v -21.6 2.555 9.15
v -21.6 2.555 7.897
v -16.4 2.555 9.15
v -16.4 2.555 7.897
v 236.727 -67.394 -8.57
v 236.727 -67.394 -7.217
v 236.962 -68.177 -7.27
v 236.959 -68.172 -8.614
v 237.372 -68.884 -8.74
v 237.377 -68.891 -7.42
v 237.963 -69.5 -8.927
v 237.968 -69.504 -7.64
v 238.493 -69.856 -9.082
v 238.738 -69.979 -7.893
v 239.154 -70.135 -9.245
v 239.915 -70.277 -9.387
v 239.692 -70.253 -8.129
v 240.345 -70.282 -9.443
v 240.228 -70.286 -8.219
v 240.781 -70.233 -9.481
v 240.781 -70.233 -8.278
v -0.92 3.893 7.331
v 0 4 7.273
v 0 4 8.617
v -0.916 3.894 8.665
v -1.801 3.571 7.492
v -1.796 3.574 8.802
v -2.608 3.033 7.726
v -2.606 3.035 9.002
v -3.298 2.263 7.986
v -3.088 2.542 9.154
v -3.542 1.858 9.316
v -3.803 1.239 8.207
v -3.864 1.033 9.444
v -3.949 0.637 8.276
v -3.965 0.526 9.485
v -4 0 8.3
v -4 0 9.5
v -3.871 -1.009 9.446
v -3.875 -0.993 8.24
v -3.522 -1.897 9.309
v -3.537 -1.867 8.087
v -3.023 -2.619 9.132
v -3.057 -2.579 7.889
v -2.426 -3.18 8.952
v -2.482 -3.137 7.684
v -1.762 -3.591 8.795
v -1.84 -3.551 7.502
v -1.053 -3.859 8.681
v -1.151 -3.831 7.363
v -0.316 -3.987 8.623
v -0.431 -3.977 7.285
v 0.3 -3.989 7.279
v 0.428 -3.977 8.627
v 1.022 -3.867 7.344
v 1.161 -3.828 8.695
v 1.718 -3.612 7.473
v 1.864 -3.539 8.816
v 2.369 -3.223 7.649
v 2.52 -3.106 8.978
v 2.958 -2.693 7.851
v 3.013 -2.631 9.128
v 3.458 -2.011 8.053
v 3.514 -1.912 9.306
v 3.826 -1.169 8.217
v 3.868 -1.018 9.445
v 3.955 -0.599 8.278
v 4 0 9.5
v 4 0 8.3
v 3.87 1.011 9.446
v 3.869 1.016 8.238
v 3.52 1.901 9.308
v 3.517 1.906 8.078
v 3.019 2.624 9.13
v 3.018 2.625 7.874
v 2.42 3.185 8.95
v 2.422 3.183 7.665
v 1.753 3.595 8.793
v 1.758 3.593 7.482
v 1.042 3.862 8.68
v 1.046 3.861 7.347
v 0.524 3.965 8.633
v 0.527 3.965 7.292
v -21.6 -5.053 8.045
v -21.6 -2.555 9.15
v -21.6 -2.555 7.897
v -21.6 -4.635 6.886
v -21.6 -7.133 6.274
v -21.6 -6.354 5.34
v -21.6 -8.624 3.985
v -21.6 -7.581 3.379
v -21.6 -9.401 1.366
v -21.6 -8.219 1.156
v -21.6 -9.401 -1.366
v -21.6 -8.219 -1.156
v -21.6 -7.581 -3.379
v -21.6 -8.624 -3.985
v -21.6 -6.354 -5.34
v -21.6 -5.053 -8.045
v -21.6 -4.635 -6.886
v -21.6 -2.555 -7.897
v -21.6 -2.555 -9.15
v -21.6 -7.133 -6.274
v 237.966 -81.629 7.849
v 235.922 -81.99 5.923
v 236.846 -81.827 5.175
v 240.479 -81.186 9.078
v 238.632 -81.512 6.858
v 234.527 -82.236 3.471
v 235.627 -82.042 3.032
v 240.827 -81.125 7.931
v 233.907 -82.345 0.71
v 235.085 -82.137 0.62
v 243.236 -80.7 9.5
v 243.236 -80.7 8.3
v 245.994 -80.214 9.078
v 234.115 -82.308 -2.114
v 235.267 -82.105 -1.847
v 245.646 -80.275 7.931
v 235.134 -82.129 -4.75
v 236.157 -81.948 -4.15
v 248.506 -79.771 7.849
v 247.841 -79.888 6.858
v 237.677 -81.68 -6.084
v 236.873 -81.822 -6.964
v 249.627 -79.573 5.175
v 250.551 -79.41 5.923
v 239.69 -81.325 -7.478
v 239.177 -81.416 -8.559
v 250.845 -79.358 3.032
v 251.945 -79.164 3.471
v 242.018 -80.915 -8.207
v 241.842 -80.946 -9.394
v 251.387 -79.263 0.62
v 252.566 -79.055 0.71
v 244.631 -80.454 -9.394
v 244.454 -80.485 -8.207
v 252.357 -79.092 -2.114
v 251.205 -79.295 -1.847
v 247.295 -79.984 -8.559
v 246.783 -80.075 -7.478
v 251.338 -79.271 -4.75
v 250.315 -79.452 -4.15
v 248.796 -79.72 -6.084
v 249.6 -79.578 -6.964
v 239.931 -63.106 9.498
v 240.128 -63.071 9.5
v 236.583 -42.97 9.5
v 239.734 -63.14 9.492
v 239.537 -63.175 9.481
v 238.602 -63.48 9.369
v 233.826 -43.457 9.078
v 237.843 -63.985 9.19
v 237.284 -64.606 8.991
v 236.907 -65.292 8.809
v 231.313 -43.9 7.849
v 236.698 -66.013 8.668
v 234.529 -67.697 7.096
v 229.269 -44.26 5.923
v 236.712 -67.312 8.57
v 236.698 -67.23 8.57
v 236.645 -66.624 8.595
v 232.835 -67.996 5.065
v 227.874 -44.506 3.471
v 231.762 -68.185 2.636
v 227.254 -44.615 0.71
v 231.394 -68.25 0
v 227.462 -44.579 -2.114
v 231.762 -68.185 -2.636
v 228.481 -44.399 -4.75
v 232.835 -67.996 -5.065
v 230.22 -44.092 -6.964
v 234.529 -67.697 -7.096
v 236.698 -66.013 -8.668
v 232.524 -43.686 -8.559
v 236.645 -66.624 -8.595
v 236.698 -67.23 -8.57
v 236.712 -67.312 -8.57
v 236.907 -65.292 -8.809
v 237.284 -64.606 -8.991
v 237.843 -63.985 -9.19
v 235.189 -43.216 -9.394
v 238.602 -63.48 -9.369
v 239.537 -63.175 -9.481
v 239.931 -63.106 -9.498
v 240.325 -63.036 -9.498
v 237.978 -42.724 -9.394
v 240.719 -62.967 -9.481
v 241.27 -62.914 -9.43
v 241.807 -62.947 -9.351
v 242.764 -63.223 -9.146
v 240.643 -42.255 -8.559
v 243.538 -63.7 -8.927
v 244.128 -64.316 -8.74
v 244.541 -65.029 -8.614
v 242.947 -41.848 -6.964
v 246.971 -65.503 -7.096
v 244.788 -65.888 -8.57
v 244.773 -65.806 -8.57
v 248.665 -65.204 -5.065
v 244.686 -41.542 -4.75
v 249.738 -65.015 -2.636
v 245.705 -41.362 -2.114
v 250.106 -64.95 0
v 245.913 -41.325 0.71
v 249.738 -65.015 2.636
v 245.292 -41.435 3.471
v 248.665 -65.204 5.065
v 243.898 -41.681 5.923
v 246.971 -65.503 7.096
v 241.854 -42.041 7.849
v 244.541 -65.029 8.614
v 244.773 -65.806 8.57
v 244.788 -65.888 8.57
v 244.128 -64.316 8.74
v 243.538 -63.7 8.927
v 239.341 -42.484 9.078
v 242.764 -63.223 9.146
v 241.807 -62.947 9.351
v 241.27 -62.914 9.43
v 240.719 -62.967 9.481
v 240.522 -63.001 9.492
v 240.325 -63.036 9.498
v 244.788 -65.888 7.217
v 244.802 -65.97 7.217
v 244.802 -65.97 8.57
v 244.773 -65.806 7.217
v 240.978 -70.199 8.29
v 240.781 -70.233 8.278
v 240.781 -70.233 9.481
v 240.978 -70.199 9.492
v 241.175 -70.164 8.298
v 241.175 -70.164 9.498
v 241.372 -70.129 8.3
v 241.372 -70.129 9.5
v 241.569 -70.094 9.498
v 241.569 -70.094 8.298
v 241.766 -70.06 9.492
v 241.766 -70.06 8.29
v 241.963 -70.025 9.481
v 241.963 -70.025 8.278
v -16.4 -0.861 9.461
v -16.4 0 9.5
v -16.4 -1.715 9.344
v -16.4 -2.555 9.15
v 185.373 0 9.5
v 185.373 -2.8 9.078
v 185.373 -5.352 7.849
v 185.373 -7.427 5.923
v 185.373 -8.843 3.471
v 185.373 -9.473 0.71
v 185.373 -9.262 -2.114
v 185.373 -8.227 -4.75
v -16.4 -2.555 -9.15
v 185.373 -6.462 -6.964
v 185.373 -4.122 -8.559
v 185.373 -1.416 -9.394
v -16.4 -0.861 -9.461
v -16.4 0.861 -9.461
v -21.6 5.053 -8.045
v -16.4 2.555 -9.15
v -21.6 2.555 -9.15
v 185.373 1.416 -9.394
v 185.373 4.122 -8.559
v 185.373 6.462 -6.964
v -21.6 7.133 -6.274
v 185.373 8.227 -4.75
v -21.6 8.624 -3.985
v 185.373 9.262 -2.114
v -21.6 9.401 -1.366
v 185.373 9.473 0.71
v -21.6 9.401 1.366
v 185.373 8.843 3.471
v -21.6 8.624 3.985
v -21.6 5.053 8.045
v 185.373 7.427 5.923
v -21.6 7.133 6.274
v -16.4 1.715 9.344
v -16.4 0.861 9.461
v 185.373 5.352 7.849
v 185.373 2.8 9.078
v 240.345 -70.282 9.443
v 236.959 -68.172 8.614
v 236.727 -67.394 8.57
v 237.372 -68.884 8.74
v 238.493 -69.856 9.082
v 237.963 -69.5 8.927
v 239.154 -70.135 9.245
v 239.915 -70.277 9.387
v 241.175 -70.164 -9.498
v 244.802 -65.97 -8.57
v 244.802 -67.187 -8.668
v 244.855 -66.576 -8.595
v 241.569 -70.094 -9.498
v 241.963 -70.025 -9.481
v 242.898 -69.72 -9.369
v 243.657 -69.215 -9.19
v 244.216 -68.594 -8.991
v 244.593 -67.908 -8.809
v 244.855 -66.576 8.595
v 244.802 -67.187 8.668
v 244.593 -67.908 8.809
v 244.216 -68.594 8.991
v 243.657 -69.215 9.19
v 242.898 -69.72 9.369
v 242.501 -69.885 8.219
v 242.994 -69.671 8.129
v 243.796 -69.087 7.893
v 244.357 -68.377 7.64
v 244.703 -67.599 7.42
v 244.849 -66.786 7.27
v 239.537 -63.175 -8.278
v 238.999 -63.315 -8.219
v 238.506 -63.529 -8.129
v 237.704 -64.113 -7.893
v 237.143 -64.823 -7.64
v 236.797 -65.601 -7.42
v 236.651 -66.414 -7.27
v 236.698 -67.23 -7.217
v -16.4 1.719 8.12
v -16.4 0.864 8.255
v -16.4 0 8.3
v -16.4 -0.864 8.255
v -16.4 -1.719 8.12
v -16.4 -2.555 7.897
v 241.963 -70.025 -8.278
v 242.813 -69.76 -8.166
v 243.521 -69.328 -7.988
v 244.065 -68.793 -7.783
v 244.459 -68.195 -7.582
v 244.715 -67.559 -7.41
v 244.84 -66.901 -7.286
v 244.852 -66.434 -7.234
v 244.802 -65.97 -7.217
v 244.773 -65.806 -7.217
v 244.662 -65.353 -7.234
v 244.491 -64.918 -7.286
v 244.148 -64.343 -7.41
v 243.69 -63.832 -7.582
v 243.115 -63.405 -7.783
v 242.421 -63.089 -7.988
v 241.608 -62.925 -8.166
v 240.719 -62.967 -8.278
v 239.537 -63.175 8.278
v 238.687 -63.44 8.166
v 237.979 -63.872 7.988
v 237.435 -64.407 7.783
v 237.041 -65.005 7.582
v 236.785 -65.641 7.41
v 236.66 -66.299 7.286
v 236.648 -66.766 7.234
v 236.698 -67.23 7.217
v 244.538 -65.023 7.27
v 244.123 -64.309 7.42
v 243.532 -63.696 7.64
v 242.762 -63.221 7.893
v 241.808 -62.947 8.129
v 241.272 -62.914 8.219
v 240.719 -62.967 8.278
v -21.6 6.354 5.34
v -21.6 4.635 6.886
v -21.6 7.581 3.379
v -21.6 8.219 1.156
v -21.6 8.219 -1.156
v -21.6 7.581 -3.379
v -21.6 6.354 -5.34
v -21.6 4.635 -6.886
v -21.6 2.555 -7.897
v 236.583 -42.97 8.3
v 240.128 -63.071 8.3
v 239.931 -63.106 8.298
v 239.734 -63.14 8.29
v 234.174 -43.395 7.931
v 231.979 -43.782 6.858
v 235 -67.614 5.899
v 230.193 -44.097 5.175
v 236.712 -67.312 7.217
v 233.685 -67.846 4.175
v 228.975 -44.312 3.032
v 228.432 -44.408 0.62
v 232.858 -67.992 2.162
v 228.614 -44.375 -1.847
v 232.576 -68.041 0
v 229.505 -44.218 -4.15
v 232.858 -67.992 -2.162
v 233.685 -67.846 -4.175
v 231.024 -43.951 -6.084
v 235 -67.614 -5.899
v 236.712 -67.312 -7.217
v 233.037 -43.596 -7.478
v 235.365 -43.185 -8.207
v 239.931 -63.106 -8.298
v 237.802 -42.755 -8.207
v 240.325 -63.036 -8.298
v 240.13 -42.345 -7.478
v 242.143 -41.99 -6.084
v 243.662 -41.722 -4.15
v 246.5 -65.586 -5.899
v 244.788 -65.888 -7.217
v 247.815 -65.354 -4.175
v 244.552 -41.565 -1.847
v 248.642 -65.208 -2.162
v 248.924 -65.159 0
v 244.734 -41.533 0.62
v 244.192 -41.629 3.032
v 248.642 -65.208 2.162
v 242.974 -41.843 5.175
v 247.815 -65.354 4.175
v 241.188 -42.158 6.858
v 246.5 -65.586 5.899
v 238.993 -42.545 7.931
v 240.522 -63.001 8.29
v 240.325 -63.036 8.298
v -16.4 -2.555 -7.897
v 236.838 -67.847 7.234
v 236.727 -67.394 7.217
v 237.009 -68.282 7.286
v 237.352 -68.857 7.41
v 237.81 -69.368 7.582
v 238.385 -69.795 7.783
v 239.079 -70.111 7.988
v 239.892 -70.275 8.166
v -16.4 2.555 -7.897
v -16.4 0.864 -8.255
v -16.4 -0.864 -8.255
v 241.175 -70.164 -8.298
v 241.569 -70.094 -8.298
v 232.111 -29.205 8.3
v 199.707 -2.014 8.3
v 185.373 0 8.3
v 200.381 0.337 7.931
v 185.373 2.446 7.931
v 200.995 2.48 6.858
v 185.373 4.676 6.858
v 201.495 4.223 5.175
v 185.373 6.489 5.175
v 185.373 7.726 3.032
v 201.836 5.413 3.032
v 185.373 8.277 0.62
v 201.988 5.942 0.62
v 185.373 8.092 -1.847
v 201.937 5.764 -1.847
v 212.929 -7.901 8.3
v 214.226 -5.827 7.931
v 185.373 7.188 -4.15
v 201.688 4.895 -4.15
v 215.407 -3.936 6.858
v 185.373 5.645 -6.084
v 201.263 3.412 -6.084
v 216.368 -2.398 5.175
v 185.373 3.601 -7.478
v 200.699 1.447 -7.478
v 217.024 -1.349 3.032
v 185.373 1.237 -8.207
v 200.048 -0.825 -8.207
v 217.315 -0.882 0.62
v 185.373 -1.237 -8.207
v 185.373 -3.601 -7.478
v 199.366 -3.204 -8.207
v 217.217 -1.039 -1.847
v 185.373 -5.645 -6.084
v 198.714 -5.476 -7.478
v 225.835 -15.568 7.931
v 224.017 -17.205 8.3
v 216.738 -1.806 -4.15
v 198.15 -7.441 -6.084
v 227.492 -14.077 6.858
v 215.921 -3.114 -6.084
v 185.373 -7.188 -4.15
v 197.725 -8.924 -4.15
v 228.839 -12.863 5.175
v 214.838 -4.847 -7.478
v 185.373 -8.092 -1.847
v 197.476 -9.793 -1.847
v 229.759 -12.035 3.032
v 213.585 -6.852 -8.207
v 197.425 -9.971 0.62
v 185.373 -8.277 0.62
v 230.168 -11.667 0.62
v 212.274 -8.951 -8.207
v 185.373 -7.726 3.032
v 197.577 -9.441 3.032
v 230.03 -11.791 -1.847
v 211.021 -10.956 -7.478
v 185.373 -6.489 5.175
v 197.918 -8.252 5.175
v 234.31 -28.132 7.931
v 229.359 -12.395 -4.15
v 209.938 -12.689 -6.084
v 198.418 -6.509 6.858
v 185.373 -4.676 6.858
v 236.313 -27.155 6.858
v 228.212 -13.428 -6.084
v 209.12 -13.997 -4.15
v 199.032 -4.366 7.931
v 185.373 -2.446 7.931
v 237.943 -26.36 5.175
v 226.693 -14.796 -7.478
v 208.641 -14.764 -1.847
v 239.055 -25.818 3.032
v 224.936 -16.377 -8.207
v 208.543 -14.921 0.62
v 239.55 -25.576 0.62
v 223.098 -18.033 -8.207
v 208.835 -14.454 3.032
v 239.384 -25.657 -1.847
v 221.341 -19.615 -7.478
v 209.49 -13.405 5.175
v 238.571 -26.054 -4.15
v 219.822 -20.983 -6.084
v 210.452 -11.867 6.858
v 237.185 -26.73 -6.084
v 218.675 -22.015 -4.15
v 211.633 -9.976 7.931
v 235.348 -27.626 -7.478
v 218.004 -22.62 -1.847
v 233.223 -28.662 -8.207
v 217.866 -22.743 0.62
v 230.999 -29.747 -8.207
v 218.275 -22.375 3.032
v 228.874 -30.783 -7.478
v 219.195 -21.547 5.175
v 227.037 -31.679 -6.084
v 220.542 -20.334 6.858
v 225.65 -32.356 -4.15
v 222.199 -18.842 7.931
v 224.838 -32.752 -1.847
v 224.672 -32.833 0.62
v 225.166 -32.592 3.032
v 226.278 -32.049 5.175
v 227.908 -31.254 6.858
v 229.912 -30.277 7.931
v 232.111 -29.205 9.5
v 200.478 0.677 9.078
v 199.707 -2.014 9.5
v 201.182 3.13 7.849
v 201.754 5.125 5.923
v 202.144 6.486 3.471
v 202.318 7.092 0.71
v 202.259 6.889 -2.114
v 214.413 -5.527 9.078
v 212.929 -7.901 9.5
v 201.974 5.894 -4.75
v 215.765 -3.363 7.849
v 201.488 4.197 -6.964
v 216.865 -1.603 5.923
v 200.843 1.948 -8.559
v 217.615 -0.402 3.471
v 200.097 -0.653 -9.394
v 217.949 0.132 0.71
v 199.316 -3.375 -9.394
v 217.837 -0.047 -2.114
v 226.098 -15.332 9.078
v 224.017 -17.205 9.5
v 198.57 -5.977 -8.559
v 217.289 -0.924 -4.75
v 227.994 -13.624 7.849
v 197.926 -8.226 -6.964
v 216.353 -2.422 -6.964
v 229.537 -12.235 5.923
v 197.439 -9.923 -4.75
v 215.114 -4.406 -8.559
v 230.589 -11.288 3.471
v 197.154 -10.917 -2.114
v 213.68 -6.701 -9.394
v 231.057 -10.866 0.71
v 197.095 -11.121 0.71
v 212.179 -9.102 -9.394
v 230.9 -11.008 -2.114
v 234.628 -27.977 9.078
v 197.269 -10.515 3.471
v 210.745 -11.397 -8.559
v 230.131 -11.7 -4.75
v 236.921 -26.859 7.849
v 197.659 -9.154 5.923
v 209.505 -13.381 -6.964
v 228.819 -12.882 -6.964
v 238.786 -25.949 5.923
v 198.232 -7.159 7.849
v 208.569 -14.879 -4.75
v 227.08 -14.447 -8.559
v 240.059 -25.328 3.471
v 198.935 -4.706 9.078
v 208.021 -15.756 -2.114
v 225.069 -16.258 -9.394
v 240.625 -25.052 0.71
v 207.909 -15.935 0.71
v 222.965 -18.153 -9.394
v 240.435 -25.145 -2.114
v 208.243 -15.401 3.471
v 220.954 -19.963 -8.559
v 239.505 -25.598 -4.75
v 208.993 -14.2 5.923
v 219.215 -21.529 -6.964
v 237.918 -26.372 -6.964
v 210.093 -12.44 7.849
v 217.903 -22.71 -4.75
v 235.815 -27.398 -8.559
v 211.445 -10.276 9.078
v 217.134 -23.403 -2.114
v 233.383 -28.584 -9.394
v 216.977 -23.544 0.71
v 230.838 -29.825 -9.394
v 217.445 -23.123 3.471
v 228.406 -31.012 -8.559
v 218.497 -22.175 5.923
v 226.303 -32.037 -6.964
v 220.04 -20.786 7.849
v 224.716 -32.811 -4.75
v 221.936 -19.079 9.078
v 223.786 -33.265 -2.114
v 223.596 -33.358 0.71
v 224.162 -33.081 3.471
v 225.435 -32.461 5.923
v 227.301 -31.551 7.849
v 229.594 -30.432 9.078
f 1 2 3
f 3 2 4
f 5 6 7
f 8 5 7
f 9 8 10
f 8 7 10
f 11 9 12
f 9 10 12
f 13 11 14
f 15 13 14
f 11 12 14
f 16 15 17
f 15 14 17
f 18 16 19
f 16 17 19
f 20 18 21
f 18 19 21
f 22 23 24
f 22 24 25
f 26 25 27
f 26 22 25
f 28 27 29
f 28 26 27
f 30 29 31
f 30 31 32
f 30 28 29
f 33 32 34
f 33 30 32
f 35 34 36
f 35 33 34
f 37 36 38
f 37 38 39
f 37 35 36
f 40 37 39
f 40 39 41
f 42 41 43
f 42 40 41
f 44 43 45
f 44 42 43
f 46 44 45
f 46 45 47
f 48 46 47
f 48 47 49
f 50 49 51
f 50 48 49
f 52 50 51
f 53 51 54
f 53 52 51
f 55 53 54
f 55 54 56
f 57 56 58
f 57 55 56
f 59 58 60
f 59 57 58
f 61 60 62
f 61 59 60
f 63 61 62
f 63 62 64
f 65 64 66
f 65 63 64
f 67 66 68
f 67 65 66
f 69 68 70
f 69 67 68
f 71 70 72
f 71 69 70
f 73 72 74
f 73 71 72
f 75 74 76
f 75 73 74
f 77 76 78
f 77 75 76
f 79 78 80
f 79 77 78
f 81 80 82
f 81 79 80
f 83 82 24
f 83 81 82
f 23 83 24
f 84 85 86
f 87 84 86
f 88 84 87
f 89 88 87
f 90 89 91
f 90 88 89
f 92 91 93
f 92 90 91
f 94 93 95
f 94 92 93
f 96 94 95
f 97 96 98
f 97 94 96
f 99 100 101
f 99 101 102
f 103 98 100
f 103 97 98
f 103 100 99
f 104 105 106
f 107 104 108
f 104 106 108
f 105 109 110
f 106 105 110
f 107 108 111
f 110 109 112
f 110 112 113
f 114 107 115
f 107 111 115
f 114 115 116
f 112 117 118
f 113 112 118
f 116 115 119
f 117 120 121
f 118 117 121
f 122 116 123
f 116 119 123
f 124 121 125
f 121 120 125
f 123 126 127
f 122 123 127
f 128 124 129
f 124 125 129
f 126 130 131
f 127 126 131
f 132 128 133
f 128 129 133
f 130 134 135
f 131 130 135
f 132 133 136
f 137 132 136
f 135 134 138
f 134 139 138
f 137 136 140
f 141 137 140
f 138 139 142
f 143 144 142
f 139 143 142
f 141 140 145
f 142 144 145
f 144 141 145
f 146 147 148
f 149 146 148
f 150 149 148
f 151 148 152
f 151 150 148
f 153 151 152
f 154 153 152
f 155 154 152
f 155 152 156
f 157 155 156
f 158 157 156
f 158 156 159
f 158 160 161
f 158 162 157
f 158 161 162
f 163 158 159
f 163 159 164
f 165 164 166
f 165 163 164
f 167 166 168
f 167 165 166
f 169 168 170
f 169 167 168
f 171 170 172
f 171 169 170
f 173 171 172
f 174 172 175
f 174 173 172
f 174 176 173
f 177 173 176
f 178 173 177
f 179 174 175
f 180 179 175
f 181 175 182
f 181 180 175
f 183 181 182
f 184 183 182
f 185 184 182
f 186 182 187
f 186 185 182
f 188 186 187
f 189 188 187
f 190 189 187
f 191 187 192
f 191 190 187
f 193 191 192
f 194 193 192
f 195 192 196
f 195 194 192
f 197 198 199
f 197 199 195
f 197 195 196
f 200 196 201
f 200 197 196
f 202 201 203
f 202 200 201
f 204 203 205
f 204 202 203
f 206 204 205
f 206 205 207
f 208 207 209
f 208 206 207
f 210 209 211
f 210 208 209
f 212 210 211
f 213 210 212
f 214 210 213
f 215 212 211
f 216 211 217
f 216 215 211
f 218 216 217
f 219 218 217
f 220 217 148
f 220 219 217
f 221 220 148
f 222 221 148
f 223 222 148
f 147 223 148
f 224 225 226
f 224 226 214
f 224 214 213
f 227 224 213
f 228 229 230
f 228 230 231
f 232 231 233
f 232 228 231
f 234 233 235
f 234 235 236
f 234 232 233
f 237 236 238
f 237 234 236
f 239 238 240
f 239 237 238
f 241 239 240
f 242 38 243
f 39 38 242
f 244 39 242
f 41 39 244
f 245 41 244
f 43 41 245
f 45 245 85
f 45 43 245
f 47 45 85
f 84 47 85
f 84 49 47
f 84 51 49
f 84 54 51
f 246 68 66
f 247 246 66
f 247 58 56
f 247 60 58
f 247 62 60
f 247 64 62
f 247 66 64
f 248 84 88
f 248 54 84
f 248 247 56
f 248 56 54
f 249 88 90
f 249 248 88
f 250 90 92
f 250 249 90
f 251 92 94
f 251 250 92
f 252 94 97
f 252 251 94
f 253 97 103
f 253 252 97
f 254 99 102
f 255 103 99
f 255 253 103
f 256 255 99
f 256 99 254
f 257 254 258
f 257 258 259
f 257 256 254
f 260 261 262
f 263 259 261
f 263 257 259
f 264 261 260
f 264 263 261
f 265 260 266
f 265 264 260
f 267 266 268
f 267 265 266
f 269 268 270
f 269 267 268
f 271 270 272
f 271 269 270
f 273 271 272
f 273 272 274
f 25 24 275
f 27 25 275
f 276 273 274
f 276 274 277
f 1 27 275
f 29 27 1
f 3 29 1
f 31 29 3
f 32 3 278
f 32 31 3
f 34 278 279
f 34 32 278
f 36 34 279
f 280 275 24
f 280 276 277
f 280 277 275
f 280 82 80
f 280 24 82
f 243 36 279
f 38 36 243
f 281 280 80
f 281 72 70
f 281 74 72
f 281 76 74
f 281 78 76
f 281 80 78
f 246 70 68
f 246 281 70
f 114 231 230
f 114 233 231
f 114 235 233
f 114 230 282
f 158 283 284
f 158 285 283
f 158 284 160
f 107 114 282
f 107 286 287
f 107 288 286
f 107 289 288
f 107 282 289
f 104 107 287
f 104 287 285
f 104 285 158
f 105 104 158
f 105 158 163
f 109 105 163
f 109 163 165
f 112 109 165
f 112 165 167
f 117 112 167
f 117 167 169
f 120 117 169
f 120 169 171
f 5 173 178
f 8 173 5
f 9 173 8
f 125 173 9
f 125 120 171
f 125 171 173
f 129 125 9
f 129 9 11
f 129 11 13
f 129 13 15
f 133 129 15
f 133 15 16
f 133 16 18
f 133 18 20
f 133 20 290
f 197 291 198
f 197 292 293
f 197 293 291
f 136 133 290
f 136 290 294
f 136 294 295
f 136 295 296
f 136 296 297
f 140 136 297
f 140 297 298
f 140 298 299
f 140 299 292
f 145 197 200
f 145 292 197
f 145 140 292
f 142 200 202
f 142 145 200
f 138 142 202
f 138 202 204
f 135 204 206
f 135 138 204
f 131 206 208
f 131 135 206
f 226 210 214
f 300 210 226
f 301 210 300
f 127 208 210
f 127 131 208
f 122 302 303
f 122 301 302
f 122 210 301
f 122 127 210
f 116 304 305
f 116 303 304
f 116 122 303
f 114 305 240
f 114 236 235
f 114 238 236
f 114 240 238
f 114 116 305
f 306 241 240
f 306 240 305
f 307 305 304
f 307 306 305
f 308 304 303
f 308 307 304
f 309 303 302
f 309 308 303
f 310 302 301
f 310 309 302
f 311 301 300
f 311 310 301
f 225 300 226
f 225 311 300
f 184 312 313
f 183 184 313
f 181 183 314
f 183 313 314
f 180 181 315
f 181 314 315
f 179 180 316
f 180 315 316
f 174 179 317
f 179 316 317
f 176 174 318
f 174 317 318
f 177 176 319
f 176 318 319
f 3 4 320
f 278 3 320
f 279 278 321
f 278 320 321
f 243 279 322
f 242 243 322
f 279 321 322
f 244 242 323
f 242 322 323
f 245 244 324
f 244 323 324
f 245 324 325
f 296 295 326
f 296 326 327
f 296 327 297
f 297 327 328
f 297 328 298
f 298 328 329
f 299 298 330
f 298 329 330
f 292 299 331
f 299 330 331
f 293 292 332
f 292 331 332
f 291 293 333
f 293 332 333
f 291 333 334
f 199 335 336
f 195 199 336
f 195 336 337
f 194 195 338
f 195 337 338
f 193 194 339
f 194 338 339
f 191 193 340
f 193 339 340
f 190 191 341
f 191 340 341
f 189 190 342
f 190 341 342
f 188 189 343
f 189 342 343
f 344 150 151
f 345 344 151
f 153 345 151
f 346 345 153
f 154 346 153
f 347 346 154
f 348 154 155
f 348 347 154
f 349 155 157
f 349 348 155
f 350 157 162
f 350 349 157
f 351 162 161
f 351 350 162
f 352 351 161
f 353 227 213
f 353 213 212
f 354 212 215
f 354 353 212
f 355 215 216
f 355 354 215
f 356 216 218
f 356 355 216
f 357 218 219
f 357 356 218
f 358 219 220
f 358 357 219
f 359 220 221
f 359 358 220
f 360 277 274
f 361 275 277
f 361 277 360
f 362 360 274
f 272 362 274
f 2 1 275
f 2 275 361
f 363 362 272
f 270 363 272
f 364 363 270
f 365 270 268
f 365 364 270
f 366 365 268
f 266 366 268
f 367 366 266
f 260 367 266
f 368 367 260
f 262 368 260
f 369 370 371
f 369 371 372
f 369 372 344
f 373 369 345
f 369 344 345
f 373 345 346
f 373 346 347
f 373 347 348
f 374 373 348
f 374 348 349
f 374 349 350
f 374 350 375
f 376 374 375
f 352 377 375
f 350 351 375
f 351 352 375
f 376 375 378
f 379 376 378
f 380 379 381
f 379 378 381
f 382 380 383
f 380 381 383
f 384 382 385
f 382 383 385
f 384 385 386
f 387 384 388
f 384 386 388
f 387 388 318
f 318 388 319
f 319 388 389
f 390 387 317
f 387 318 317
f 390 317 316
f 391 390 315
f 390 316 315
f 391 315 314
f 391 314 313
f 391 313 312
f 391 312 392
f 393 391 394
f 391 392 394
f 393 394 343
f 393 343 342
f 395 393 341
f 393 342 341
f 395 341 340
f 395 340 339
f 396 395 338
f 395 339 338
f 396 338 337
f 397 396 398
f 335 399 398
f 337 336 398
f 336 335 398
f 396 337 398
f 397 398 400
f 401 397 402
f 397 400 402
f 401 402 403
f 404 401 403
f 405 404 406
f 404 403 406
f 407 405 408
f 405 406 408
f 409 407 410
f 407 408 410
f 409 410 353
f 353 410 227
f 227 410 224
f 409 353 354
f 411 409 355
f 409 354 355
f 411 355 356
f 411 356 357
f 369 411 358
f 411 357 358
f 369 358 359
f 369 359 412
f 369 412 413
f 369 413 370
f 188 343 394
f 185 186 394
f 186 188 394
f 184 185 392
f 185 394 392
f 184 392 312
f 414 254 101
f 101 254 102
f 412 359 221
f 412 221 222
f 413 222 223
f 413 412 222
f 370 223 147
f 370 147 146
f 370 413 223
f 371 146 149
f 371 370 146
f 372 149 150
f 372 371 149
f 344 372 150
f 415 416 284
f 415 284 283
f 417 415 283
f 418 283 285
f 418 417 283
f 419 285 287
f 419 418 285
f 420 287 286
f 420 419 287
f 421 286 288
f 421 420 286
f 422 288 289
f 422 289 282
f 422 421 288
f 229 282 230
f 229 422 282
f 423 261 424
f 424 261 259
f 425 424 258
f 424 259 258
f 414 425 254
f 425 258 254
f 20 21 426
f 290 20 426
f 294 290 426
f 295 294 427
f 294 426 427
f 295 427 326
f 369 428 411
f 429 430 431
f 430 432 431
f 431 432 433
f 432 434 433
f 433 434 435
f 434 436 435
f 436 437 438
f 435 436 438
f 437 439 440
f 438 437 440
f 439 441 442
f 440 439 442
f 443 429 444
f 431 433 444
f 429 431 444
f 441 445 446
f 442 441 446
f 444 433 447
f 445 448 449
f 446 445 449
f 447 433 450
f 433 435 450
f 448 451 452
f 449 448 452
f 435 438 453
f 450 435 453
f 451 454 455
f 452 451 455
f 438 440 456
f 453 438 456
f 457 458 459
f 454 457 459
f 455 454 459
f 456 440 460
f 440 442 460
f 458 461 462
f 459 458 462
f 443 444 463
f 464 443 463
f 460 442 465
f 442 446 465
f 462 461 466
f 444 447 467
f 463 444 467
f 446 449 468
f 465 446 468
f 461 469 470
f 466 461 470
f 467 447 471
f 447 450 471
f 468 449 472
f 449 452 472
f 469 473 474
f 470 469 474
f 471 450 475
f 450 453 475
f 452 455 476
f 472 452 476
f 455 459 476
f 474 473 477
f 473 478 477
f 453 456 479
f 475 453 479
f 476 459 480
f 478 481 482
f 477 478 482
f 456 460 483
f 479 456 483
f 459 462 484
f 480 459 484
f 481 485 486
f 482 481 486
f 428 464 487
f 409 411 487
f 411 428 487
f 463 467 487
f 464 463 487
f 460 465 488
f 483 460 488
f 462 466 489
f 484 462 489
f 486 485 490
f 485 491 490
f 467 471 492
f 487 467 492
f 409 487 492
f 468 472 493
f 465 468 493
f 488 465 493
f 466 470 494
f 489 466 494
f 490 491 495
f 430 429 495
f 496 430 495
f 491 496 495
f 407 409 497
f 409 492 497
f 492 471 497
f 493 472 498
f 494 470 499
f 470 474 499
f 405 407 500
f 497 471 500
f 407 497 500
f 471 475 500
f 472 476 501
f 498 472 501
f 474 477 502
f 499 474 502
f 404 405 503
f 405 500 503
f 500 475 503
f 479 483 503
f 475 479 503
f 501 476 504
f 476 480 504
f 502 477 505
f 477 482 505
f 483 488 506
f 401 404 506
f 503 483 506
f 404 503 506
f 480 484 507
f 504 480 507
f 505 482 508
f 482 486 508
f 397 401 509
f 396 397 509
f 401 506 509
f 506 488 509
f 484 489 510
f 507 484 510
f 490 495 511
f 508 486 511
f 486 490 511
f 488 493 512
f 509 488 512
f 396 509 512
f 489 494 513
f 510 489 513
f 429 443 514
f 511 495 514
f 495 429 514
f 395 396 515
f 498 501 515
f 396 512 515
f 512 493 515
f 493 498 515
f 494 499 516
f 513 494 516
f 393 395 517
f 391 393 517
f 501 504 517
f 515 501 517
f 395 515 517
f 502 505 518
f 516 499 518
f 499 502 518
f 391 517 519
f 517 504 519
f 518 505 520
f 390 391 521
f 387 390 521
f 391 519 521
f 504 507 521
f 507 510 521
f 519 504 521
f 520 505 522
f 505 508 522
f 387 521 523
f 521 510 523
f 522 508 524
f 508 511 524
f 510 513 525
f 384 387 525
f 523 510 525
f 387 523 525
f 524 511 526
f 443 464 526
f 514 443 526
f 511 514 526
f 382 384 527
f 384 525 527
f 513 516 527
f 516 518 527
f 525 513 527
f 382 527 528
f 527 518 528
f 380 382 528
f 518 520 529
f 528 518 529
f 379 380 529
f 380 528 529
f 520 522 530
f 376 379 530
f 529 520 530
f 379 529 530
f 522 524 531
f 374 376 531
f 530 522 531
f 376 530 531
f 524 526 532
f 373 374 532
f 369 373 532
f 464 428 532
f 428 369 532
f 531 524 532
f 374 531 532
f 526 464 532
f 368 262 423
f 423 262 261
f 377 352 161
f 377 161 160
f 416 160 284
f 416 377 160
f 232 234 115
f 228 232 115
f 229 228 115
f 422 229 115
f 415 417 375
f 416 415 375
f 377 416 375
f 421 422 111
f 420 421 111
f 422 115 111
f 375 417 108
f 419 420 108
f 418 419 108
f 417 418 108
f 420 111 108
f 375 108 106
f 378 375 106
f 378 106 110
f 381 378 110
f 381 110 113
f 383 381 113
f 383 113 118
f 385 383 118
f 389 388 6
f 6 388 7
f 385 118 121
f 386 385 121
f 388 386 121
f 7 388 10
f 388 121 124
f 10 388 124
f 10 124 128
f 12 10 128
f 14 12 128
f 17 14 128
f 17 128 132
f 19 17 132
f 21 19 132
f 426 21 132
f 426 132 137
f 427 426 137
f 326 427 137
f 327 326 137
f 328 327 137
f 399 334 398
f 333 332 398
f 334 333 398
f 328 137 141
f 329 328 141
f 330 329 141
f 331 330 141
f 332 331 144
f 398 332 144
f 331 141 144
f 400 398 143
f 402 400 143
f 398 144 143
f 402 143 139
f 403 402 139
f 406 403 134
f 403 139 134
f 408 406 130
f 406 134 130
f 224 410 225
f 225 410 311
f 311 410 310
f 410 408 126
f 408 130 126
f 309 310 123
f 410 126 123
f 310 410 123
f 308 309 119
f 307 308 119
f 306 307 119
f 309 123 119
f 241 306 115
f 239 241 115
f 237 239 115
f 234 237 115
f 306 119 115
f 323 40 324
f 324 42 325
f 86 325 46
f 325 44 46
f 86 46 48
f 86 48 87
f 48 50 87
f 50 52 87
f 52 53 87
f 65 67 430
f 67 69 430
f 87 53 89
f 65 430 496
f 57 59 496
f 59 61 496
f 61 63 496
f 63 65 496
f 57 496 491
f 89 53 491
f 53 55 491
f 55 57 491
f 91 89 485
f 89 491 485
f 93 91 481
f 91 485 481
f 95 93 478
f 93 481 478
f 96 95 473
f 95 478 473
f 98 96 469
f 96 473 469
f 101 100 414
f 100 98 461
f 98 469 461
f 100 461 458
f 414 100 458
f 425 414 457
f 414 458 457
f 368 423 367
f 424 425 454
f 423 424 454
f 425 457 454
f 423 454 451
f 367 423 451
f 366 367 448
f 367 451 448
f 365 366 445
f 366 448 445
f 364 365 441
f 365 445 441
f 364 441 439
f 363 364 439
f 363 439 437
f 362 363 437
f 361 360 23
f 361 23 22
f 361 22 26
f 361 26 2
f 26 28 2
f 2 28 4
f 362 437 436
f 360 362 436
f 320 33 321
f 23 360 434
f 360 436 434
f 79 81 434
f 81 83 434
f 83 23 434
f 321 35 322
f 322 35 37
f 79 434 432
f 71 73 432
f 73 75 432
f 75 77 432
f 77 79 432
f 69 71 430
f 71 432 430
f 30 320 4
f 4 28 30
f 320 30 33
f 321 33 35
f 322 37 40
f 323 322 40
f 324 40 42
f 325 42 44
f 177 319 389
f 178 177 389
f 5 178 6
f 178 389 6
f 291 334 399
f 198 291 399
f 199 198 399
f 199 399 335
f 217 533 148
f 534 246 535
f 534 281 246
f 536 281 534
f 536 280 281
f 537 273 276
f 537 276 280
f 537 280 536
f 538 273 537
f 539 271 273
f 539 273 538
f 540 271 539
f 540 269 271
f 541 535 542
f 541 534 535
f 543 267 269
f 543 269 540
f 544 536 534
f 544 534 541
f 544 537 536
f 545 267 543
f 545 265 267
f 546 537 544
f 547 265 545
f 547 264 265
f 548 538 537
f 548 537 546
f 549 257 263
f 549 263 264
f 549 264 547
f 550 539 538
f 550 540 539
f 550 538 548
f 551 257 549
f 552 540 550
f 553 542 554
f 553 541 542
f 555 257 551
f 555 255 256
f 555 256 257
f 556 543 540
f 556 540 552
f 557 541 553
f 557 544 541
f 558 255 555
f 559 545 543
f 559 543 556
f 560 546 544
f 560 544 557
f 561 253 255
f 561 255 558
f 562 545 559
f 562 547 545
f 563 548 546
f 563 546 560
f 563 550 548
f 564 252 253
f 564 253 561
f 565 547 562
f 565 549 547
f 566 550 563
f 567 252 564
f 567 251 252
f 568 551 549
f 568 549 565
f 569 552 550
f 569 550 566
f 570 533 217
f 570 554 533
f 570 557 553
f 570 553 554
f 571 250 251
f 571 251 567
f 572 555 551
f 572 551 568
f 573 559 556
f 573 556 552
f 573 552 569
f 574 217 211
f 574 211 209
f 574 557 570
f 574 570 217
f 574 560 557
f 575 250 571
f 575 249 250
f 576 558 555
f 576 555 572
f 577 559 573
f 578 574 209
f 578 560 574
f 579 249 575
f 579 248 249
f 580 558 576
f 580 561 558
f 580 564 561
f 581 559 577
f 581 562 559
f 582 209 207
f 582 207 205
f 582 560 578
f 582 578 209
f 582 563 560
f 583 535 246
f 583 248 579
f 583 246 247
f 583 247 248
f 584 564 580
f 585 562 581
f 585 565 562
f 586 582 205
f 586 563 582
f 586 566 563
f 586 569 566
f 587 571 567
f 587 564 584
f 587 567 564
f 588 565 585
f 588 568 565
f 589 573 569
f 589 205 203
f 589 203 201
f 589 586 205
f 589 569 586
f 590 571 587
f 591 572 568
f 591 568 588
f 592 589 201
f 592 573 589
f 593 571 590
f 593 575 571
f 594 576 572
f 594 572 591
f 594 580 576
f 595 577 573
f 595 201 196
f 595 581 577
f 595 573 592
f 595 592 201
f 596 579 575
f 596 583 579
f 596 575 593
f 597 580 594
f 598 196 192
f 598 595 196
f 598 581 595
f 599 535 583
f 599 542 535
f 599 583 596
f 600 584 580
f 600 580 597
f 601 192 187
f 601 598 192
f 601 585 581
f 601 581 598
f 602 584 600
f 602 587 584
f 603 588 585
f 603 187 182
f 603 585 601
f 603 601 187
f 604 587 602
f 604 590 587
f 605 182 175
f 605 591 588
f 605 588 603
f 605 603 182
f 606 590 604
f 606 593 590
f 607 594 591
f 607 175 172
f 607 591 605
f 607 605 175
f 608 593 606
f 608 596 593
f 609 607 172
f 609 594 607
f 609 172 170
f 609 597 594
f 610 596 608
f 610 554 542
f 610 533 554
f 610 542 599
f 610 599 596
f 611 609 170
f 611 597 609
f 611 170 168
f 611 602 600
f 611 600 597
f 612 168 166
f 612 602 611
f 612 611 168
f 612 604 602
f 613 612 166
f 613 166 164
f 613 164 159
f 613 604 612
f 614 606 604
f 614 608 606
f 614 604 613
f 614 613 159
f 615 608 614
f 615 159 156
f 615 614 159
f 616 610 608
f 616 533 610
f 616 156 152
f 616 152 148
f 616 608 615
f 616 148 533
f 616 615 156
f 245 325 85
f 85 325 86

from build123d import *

# Parameters (mm, degrees)
SKETCH2_R                      = 9.5
SKETCH2_R_2                    = 8.3
CUT_EXTRUDE1_REACH             = 267.847
CUT_EXTRUDE1_DIRECTION_2_REACH = 267.847
CUT_EXTRUDE2_REACH             = 267.847
CUT_EXTRUDE2_END_RADIUS        = 9.5
SKETCH4_R                      = 4
CUT_EXTRUDE3_DEPTH             = 266.846527331
CUT_EXTRUDE3_DEPTH_BACK        = 266.846527331


with BuildPart() as part:
    # Sweep1: sweep along a path in Sketch1
    with BuildLine(Plane.XY) as sweep1_path:
        Line((-21.6, 0), (0, 0))
        Line((0, 0), (185.373442264, 0))
        ThreePointArc((185.373442264, 0), (218.798397967, -12.165688958), (236.58344542, -42.970294761))
        Line((236.58344542, -42.970294761), (240.75, -66.6))
        Line((240.75, -66.6), (243.236210428, -80.7))
    # Sketch2 → Sweep1 (sweep)
    with BuildSketch(Plane.ZY.offset(21.6)):
        Circle(SKETCH2_R)
        Circle(SKETCH2_R_2, mode=Mode.SUBTRACT)
    sweep(path=sweep1_path.line)

    # Sketch3 → Cut-Extrude1 (cut, up to next)
    with BuildSketch(Plane.XY, mode=Mode.PRIVATE) as cut_extrude1_sk1:
        with BuildLine():
            Line((244.802222036, -65.97033418), (244.773201539, -65.805750763))
            ThreePointArc((244.773201539, -65.805750763), (243.33389193, -63.54648723), (240.718605781, -62.966692249))
            Line((240.718605781, -62.966692249), (239.536836478, -63.175070062))
            ThreePointArc((239.536836478, -63.175070062), (237.277572945, -64.614379671), (236.697777964, -67.22966582))
            Line((236.697777964, -67.22966582), (236.726798461, -67.394249237))
            ThreePointArc((236.726798461, -67.394249237), (238.16610807, -69.65351277), (240.781394219, -70.233307751))
            Line((240.781394219, -70.233307751), (241.963163522, -70.024929938))
            ThreePointArc((241.963163522, -70.024929938), (244.222427055, -68.585620329), (244.802222036, -65.97033418))
        make_face()
    cut_extrude1_tool1 = extrude(cut_extrude1_sk1.sketch, amount=-CUT_EXTRUDE1_REACH, mode=Mode.PRIVATE) & part.part
    add(cut_extrude1_tool1.solids().sort_by_distance((240.75, -66.6, 0))[0], mode=Mode.SUBTRACT)

    # Sketch3 → Cut-Extrude1 direction 2 (cut, up to next)
    with BuildSketch(Plane.XY, mode=Mode.PRIVATE) as cut_extrude1_direction_2_sk1:
        with BuildLine():
            Line((244.802222036, -65.97033418), (244.773201539, -65.805750763))
            ThreePointArc((244.773201539, -65.805750763), (243.33389193, -63.54648723), (240.718605781, -62.966692249))
            Line((240.718605781, -62.966692249), (239.536836478, -63.175070062))
            ThreePointArc((239.536836478, -63.175070062), (237.277572945, -64.614379671), (236.697777964, -67.22966582))
            Line((236.697777964, -67.22966582), (236.726798461, -67.394249237))
            ThreePointArc((236.726798461, -67.394249237), (238.16610807, -69.65351277), (240.781394219, -70.233307751))
            Line((240.781394219, -70.233307751), (241.963163522, -70.024929938))
            ThreePointArc((241.963163522, -70.024929938), (244.222427055, -68.585620329), (244.802222036, -65.97033418))
        make_face()
    cut_extrude1_direction_2_tool1 = extrude(cut_extrude1_direction_2_sk1.sketch, amount=CUT_EXTRUDE1_DIRECTION_2_REACH, mode=Mode.PRIVATE) & part.part
    add(cut_extrude1_direction_2_tool1.solids().sort_by_distance((240.75, -66.6, 0))[0], mode=Mode.SUBTRACT)

    # Cut-Extrude2: up to this cylinder (the profile starts inside it)
    cut_extrude2_end = Plane(origin=(0, 0, 0), z_dir=(-1, 0, 0)) * Cylinder(CUT_EXTRUDE2_END_RADIUS, 555.694, mode=Mode.PRIVATE)
    # Sketch4 → Cut-Extrude2 (cut, up to the surface)
    with BuildSketch(Plane.XY, mode=Mode.PRIVATE) as cut_extrude2_sk1:
        with Locations(Location((0, 0, 0), (0, 0, 90))):
            Circle(SKETCH4_R)
    cut_extrude2_tool1 = extrude(cut_extrude2_sk1.sketch, amount=CUT_EXTRUDE2_REACH, mode=Mode.PRIVATE) & cut_extrude2_end
    add(cut_extrude2_tool1.solids().sort_by_distance((0, 0, 0))[0], mode=Mode.SUBTRACT)

    # Sketch5 → Cut-Extrude3 (cut, two sides: drawn at the far end of the back side and taken through both)
    with BuildSketch(Plane.XY.offset(-CUT_EXTRUDE3_DEPTH_BACK)):
        Polygon((-21.6, 0), (-21.6, 2.555), (-16.4, 2.555), (-16.4, -2.555), (-21.6, -2.555), align=None)
    extrude(amount=CUT_EXTRUDE3_DEPTH + CUT_EXTRUDE3_DEPTH_BACK, mode=Mode.SUBTRACT)


solid = part.part
